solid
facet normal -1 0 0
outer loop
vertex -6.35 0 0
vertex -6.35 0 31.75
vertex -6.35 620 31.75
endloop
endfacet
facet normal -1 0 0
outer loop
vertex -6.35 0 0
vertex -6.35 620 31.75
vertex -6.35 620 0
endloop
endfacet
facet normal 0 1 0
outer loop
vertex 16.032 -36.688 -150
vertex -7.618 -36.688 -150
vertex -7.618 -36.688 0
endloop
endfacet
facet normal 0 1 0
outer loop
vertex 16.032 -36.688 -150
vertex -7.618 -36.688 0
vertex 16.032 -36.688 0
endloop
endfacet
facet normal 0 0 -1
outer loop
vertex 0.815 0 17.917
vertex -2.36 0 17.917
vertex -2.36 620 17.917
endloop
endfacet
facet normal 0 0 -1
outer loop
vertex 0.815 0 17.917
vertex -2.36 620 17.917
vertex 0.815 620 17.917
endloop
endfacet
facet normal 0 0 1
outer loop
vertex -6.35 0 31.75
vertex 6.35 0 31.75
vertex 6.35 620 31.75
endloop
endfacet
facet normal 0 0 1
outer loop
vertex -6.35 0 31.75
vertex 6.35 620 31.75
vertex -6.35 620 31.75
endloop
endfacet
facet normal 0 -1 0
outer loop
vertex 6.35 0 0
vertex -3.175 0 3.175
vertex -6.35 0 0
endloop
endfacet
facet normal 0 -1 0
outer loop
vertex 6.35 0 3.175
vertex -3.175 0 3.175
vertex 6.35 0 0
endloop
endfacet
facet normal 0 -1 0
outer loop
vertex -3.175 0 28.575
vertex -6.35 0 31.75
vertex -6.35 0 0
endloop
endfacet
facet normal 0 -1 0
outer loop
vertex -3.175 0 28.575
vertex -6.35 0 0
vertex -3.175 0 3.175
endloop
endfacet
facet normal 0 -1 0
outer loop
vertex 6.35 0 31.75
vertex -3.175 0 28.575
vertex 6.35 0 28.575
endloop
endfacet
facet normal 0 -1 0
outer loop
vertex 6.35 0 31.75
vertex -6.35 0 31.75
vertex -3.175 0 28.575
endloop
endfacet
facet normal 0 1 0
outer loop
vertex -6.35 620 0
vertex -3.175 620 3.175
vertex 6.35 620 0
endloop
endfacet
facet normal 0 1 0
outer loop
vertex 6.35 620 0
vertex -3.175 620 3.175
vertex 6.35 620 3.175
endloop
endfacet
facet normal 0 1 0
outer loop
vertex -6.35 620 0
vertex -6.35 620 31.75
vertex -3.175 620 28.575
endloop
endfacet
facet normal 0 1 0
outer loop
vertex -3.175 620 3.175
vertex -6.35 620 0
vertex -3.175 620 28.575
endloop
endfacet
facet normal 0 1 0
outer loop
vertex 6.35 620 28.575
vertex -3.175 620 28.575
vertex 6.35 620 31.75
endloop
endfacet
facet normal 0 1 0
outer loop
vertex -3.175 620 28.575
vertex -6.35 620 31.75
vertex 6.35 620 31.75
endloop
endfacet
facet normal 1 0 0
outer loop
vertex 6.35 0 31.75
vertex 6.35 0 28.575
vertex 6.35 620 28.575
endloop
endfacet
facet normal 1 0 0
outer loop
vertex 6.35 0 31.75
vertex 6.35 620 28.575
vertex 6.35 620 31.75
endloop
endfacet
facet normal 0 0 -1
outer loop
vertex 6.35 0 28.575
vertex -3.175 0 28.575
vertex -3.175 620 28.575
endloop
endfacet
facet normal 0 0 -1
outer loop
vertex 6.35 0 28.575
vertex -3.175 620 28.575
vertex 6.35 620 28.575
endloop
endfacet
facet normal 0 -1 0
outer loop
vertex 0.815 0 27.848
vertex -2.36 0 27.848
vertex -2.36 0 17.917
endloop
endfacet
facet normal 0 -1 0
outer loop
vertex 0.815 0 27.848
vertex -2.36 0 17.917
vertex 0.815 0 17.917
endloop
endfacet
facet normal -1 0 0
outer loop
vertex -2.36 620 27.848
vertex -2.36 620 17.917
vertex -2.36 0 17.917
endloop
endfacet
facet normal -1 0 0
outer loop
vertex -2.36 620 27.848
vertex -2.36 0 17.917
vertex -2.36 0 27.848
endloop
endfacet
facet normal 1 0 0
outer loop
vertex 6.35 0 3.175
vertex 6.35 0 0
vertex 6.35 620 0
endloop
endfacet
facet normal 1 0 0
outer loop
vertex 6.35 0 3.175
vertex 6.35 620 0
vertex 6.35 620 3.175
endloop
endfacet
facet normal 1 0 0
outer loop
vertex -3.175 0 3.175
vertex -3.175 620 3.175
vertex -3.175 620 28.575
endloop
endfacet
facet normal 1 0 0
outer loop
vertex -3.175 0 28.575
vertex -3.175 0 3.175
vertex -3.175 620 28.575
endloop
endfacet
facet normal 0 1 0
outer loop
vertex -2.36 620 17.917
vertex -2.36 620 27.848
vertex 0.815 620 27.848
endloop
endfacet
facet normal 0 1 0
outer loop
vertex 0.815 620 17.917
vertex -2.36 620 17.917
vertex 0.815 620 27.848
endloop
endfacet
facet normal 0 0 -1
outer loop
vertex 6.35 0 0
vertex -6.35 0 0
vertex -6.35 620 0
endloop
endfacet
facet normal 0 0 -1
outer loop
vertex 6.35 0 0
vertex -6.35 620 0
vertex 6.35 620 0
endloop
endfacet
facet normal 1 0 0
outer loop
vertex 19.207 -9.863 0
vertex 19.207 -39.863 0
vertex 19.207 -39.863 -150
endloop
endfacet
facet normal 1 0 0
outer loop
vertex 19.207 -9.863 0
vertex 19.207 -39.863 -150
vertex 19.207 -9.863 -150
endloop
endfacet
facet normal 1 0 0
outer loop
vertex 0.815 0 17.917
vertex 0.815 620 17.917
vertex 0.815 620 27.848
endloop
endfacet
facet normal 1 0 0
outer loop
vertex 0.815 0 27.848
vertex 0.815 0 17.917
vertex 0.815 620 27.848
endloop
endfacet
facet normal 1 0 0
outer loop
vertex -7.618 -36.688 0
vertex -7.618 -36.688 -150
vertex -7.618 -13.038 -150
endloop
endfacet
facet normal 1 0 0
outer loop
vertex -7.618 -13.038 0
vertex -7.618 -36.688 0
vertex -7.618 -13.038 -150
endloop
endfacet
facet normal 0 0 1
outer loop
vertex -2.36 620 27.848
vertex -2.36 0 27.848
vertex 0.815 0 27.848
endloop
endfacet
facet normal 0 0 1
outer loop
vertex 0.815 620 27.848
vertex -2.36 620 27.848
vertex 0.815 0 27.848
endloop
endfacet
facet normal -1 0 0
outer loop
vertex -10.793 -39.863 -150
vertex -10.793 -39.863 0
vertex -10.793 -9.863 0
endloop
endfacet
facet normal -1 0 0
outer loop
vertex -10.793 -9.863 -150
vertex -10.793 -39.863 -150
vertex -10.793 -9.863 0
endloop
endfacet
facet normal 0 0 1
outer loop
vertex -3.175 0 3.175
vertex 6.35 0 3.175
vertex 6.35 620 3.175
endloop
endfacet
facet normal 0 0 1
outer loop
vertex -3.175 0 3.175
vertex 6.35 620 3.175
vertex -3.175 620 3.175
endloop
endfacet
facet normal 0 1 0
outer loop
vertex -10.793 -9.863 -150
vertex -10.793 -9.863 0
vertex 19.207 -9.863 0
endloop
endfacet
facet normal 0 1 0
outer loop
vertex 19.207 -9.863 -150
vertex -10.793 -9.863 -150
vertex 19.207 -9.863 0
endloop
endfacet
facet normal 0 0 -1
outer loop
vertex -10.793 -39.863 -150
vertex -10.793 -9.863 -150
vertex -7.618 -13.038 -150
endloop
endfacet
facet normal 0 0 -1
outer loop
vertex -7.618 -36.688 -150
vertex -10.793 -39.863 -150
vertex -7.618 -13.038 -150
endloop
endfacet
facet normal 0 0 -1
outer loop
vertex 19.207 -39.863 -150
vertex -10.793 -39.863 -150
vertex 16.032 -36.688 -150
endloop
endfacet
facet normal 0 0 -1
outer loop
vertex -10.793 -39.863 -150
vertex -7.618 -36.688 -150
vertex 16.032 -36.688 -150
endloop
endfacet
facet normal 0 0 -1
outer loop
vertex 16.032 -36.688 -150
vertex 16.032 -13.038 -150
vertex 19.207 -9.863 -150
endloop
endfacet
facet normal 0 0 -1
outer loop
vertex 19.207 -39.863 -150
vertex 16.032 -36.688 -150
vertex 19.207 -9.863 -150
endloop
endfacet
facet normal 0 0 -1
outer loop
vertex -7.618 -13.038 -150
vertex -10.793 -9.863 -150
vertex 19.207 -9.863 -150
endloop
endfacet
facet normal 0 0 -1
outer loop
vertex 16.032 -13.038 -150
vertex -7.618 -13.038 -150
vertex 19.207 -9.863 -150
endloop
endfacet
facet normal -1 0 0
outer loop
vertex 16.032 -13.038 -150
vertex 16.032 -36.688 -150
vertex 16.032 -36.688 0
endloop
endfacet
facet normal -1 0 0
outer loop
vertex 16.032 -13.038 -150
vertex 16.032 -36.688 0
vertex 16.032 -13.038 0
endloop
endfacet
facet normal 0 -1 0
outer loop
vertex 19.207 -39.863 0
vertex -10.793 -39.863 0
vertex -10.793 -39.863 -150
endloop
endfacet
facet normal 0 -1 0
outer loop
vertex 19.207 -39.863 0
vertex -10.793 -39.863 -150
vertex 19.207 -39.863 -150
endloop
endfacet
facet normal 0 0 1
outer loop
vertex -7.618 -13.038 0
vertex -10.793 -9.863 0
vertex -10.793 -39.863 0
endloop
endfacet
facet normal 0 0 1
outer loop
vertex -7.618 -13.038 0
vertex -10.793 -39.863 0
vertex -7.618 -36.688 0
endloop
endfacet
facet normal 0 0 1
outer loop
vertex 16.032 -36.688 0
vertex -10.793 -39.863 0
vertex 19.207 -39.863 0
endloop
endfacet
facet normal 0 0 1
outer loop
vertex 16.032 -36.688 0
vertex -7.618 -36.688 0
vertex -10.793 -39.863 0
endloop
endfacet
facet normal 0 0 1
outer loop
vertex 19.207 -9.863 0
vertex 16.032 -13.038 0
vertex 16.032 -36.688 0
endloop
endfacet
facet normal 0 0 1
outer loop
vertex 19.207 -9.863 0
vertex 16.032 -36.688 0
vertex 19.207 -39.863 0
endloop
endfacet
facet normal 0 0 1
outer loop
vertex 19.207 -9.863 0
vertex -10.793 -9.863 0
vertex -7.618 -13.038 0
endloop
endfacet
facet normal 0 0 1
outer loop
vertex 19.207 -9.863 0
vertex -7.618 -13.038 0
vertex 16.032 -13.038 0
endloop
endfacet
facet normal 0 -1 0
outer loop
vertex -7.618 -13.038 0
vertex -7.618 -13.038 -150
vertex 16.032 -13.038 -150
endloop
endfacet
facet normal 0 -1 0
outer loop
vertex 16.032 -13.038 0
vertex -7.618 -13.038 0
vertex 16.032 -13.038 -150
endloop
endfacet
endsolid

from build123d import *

# Parameters (mm, degrees)
F2_DEPTH = 620
F1_W     = 3.175
F1_H     = 9.9314
F3_DEPTH = 620
F4_W     = 30
F4_H     = 30
F4_W_2   = 23.65
F4_H_2   = 23.65
F5_DEPTH = 150


with BuildPart() as f2:
    # F0 (on Front) → F2 (new body)
    with BuildSketch(Plane.XZ):
        Polygon((6.35, 31.75), (-6.35, 31.75), (-6.35, 0), (6.35, 0), (6.35, 3.175), (-3.175, 3.175), (-3.175, 28.575), (6.35, 28.575), align=None)
    extrude(amount=-F2_DEPTH)


with BuildPart() as f3:
    # F1 (on Front) → F3 (new body)
    with BuildSketch(Plane.XZ):
        with Locations((-0.772288, 22.882544)):
            Rectangle(F1_W, F1_H)
    extrude(amount=-F3_DEPTH)


with BuildPart() as f5:
    # F4 (on Top) → F5 (new body)
    with BuildSketch(Plane.XY):
        with Locations((4.207279, -24.863193)):
            Rectangle(F4_W, F4_H)
        with Locations((4.207279, -24.863193)):
            Rectangle(F4_W_2, F4_H_2, mode=Mode.SUBTRACT)
    extrude(amount=-F5_DEPTH)


solid = Compound([f2.part, f3.part, f5.part])
